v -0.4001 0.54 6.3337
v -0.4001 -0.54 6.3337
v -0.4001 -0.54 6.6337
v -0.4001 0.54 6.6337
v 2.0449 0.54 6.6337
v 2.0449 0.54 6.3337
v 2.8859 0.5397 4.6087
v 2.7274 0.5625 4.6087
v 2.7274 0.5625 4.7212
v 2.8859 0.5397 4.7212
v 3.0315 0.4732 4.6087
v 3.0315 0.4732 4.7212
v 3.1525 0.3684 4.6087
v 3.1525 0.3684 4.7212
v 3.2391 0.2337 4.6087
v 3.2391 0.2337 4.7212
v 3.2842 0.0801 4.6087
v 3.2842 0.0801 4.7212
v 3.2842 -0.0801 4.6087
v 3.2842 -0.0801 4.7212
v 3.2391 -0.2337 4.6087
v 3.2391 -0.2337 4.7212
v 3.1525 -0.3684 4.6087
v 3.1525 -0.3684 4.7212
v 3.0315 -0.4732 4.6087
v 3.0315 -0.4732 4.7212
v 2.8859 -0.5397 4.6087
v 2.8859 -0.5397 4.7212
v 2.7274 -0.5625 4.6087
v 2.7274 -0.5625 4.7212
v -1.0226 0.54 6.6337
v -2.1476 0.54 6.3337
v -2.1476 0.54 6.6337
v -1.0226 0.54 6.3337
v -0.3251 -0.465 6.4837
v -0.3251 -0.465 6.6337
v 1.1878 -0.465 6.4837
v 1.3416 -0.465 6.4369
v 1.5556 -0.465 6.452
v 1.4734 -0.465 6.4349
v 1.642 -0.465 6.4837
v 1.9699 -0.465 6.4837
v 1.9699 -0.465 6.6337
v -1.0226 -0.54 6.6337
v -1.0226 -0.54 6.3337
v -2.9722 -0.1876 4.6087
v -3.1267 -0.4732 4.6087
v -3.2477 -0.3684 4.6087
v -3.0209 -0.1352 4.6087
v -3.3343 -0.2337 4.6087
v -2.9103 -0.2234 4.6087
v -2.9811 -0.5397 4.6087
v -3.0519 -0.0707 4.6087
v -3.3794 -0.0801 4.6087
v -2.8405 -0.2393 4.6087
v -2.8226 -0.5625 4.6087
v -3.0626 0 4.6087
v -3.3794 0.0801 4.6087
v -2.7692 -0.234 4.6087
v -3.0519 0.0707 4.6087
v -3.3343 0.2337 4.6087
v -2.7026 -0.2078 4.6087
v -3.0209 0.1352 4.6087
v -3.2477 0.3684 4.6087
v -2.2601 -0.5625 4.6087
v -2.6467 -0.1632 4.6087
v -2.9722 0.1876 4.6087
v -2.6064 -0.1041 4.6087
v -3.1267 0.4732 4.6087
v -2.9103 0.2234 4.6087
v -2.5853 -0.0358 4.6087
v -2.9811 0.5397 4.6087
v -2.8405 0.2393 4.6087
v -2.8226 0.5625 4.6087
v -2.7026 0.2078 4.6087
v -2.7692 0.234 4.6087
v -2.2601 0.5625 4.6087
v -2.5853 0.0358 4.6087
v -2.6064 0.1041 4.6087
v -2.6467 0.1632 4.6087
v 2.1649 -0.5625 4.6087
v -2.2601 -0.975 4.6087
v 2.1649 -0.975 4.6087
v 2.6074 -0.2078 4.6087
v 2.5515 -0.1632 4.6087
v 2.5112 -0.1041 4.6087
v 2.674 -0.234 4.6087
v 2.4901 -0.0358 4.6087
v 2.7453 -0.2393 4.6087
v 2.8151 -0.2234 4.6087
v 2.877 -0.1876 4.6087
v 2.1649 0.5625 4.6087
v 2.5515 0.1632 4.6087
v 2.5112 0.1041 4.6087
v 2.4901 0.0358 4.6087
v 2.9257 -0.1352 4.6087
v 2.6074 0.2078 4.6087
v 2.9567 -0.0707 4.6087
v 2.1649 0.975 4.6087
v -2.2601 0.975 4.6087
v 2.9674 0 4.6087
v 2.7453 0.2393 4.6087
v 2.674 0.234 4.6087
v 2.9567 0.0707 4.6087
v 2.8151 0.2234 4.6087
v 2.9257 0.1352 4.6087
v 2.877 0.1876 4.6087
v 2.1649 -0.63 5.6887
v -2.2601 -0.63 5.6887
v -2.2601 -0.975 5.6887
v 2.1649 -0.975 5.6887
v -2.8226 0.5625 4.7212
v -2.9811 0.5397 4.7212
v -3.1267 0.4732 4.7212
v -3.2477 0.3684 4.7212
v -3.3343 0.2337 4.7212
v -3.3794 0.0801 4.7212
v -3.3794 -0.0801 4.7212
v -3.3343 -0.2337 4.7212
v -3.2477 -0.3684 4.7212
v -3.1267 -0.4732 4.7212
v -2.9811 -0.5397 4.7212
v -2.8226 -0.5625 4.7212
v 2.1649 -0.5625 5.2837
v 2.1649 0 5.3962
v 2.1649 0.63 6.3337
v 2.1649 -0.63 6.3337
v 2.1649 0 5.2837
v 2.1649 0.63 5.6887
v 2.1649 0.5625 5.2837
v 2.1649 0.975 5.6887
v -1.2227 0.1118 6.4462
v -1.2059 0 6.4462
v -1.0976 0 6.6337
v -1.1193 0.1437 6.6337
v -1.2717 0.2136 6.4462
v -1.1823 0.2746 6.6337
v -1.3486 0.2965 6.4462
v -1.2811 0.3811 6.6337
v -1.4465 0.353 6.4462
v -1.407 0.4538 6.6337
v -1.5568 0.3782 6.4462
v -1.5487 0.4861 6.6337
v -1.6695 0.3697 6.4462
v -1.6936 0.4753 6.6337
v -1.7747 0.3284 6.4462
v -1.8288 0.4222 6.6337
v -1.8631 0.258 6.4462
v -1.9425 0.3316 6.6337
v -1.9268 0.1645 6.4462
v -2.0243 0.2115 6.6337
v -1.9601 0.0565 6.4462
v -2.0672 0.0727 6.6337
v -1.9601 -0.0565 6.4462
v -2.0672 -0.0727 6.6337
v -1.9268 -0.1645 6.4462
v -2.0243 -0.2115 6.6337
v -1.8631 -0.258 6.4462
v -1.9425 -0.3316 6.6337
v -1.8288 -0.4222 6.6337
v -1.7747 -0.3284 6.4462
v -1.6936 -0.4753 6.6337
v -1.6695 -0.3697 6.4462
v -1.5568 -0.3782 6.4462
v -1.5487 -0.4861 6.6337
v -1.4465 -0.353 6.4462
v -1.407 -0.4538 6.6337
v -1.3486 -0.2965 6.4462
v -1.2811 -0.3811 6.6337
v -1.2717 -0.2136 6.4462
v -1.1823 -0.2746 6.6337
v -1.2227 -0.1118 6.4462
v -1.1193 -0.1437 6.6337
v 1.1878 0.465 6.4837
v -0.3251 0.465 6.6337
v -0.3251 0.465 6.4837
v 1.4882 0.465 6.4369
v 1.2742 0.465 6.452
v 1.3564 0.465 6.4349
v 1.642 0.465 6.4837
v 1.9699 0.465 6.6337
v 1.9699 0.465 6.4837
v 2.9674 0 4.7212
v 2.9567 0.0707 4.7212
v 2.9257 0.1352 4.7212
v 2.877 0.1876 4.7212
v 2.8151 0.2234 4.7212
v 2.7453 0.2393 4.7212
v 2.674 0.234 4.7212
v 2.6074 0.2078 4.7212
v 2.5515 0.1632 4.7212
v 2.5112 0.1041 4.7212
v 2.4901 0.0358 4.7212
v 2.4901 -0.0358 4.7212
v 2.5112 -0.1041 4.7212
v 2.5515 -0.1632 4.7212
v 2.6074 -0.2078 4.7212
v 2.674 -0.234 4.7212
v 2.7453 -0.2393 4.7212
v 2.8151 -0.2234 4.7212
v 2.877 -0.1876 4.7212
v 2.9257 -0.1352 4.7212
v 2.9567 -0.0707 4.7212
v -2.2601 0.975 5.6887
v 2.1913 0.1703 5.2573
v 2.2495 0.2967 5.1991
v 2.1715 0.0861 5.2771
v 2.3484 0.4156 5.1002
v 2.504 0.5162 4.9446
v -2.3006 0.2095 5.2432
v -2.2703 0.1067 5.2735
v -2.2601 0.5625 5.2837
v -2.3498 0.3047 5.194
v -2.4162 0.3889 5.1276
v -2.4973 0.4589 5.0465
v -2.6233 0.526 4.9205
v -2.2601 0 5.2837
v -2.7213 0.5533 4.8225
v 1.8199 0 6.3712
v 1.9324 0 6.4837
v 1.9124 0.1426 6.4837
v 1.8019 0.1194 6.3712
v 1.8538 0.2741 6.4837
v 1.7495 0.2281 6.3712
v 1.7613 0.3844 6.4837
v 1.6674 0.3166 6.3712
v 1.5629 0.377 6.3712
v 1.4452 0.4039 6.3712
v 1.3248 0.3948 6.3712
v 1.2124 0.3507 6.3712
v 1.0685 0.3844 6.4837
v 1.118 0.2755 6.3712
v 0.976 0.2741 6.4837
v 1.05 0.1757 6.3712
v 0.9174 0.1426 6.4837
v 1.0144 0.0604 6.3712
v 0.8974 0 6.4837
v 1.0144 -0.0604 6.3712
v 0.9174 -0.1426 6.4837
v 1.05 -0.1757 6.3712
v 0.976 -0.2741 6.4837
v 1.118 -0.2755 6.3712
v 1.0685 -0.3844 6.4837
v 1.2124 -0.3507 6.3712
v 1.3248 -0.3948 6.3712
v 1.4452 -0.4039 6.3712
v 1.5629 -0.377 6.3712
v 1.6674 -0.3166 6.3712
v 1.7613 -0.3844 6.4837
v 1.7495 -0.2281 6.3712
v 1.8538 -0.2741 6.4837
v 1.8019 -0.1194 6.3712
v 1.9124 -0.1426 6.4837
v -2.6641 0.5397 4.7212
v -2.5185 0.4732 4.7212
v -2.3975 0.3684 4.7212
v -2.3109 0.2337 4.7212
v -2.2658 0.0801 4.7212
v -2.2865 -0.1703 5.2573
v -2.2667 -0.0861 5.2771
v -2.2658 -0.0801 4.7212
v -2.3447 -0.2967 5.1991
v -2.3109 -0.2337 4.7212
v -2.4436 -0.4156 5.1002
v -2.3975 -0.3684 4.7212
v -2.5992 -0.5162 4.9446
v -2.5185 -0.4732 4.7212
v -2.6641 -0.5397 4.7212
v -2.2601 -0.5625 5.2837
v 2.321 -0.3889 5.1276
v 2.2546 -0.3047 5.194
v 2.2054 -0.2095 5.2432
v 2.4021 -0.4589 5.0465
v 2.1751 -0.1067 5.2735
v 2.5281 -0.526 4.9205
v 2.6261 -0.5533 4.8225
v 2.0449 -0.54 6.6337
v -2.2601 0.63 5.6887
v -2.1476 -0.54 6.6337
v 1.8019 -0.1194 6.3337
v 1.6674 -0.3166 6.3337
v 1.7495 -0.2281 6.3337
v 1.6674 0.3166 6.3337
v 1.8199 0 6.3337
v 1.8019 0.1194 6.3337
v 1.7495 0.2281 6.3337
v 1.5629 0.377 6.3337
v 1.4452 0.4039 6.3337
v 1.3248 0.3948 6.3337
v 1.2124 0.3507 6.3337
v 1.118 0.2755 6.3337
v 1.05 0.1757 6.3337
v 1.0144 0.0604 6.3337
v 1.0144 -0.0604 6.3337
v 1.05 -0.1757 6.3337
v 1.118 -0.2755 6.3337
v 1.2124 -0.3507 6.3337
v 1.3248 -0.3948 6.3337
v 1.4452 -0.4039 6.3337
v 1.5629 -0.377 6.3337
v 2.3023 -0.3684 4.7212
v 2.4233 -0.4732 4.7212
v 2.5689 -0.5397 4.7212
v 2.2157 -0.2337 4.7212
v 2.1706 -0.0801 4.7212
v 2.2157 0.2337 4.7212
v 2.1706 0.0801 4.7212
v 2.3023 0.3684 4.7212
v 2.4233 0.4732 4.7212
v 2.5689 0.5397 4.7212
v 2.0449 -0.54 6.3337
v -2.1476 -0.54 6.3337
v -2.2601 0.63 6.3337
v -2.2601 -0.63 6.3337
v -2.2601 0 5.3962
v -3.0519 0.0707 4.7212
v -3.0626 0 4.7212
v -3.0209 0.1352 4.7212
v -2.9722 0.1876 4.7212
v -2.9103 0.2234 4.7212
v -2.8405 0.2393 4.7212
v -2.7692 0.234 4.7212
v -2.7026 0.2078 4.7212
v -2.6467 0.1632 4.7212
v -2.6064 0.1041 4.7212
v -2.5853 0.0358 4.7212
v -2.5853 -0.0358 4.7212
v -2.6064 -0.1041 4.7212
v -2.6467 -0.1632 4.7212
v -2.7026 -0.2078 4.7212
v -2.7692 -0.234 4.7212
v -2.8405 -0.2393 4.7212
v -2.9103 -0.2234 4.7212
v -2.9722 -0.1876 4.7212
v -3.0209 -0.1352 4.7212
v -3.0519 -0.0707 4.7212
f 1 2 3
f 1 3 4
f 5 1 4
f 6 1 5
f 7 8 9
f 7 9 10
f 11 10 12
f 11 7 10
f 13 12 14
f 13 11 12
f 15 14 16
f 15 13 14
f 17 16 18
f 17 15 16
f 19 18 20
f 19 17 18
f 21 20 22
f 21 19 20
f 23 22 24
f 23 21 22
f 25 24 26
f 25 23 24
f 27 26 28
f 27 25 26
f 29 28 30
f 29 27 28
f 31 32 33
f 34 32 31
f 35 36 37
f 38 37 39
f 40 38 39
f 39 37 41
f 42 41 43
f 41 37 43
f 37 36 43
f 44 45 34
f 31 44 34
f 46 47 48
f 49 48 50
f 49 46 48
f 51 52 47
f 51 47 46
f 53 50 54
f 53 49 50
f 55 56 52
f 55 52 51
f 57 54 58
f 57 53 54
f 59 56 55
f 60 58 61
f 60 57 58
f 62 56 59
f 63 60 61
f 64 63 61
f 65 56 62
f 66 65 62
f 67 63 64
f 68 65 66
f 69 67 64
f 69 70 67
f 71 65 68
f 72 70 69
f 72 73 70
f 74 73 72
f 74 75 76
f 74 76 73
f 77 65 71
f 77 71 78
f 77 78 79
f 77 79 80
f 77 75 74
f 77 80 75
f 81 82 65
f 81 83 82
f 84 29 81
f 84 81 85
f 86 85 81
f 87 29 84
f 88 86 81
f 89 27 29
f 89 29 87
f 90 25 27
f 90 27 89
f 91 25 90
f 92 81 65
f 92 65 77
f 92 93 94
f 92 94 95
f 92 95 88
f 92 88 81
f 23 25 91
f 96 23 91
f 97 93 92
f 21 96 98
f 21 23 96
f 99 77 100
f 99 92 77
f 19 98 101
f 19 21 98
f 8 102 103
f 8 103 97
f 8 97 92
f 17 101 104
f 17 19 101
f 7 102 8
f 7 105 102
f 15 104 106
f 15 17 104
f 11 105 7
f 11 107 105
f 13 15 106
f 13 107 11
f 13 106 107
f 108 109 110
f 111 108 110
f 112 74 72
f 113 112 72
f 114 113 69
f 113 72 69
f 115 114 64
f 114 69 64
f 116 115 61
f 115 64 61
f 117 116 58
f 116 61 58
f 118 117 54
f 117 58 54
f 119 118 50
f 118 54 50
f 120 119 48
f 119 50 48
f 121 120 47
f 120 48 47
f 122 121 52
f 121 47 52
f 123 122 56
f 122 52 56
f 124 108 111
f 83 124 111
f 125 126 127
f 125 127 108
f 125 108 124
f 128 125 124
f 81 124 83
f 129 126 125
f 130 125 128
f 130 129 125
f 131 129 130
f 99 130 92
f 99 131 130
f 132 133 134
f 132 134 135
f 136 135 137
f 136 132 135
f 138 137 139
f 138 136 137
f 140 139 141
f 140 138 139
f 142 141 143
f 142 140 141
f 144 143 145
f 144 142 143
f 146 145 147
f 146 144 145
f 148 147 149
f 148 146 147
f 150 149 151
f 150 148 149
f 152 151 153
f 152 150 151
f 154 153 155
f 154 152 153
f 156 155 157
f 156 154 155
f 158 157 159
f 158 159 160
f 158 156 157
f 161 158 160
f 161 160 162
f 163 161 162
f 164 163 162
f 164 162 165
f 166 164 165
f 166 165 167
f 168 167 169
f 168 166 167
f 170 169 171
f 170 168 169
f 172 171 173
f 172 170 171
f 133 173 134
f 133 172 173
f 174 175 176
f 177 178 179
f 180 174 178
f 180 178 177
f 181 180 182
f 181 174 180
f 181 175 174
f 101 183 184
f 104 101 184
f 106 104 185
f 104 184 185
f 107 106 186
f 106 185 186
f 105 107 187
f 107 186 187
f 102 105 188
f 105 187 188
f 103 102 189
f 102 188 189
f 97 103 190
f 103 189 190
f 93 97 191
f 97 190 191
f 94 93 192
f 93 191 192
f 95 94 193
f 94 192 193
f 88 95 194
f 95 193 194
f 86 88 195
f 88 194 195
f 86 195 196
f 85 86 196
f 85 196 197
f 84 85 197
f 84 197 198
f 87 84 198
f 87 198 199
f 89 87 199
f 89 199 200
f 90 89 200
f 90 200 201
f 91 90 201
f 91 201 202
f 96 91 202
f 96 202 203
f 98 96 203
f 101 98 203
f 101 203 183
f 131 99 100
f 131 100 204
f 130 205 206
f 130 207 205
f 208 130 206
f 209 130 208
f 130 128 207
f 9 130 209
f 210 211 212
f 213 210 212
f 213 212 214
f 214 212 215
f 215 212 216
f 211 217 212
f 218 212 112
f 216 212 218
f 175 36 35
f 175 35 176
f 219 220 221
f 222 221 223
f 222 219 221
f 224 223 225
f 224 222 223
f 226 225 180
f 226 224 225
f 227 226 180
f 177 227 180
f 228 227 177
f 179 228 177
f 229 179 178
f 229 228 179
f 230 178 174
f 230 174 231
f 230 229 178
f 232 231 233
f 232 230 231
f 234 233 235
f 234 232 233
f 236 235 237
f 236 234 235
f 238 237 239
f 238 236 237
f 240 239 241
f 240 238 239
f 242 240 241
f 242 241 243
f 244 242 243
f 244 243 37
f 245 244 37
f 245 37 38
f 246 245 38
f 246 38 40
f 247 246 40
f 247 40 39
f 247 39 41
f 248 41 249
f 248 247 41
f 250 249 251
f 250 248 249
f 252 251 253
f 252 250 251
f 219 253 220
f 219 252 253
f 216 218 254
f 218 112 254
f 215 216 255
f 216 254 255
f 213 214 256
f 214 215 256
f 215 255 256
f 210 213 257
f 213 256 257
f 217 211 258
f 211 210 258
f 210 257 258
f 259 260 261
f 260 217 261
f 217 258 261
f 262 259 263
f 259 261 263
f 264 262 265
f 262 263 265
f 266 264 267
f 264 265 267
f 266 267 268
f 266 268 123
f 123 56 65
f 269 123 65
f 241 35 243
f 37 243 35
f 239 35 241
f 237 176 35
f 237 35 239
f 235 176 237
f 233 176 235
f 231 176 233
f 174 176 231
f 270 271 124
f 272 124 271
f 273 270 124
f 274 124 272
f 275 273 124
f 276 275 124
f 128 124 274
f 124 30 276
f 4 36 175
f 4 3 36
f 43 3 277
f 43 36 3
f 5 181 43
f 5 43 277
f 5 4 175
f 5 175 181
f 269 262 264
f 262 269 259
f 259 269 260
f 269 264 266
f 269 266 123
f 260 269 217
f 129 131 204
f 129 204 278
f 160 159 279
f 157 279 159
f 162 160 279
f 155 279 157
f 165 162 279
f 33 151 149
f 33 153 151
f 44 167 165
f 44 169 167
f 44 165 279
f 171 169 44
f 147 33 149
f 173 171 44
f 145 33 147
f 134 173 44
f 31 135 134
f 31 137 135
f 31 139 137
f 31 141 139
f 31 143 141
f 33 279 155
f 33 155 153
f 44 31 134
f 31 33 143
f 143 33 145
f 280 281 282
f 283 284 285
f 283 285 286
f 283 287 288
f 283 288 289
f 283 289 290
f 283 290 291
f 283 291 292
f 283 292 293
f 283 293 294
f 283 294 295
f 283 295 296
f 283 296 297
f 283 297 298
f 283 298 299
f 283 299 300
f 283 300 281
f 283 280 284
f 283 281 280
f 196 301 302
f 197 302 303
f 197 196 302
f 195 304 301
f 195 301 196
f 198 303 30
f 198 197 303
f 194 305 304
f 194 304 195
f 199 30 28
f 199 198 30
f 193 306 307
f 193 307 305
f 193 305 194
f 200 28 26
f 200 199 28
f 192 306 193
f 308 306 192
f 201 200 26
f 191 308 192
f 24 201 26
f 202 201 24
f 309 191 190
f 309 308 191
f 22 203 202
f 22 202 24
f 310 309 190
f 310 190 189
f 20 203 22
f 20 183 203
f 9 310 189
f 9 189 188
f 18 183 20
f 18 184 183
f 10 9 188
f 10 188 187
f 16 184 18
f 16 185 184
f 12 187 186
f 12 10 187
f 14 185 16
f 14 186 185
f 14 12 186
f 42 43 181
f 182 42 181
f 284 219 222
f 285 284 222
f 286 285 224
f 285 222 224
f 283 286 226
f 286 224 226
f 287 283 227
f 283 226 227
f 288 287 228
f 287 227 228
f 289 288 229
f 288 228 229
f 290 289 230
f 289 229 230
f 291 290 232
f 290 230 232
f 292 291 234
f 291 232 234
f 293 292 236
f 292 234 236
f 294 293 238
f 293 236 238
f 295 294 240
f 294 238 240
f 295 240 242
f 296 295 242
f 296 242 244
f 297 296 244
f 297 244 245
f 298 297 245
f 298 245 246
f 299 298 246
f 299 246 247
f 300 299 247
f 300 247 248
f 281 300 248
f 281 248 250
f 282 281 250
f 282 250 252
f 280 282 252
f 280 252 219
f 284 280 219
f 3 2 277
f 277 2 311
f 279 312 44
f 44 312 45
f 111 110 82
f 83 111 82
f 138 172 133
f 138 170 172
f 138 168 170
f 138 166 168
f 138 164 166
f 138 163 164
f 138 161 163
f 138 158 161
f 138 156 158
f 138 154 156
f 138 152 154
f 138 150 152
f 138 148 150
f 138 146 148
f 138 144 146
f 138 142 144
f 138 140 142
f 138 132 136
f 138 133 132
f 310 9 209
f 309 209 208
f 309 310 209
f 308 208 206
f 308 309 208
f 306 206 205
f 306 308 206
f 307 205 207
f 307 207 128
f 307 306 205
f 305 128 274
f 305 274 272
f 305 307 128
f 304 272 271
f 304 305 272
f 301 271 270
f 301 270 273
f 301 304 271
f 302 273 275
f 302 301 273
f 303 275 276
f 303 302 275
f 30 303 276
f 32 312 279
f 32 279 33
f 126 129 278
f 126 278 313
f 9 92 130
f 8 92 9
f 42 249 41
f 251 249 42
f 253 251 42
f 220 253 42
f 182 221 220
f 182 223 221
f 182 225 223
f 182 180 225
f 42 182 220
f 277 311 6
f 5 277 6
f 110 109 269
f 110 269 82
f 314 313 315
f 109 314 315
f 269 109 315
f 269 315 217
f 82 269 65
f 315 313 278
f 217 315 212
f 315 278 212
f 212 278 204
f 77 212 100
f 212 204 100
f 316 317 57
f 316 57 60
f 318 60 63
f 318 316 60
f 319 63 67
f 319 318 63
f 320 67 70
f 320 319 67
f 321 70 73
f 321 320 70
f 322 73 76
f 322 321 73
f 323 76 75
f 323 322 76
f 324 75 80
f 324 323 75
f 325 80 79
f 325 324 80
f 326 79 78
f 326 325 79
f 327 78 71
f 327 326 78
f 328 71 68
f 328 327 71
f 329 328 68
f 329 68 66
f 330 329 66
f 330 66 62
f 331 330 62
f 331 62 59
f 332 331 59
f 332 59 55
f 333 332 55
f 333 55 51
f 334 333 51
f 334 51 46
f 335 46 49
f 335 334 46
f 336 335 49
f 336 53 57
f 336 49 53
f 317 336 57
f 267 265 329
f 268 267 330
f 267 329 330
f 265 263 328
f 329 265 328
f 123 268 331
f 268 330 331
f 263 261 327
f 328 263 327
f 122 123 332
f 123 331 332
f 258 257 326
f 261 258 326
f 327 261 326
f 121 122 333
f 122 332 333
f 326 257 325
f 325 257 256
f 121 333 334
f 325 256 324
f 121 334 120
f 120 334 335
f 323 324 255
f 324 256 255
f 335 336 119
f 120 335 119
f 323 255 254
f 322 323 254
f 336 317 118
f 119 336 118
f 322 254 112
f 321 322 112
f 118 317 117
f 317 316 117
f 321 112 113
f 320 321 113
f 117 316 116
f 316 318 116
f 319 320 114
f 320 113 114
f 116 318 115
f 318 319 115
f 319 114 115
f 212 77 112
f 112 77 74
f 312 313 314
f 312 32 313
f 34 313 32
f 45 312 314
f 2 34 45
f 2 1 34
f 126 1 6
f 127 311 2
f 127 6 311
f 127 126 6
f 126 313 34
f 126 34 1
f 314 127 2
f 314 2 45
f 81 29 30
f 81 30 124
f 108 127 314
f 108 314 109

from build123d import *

# Parameters (mm, degrees)
BOSS_EXTRUDE5_DEPTH = 14.75
SKETCH9_W           = 7.5
SKETCH9_H           = 7.2
SKETCH9_W_2         = 16.3
BOSS_EXTRUDE6_DEPTH = 2
SKETCH10_W          = 15.3
SKETCH10_H          = 6.2
CUT_EXTRUDE4_DEPTH  = 1
SKETCH11_R          = 2.5
CUT_EXTRUDE5_DEPTH  = 1.25
BOSS_EXTRUDE7_DEPTH = 4.5
CUT_EXTRUDE7_START  = -7.5
CUT_EXTRUDE7_DEPTH  = 7.5
SKETCH18_R          = 3.75
CUT_EXTRUDE8_DEPTH  = 4.5
SKETCH19_R          = 1.6
CUT_EXTRUDE9_DEPTH  = 4.5
CHAMFER1_SIZE       = 0.75
CHAMFER1_SIZE_2     = 1.299038106
SKETCH13_R          = 2.7
CUT_EXTRUDE6_DEPTH  = 1
CHAMFER2_SIZE       = 0.75
SCALE1_SCALE        = 0.15


# Read off the part's stored shape, not the designer's step: Cut-Extrude7
with BuildPart() as part:
    # Sketch8 → Boss-Extrude5 (new, symmetric)
    with BuildSketch(Plane(origin=(0, 0, 0), x_dir=(0, 0, -1), z_dir=(1, 0, 0))):
        Polygon((0, -6.5), (0, 6.5), (-7.2, 6.5), (-7.2, 4.2), (-11.5, 4.2), (-11.5, -4.2), (-7.2, -4.2), (-7.2, -6.5), align=None)
    extrude(amount=BOSS_EXTRUDE5_DEPTH, both=True)

    # Sketch9 → Boss-Extrude6 (add)
    with BuildSketch(Plane.XY.offset(11.5)):
        with Locations((-10.25, 0)):
            Rectangle(SKETCH9_W, SKETCH9_H)
        with Locations((5.8, 0)):
            Rectangle(SKETCH9_W_2, SKETCH9_H)
    extrude(amount=BOSS_EXTRUDE6_DEPTH)

    # Sketch10 → Cut-Extrude4 (cut)
    with BuildSketch(Plane.XY.offset(13.5)):
        with Locations((5.8, 0)):
            Rectangle(SKETCH10_W, SKETCH10_H)
    extrude(amount=-CUT_EXTRUDE4_DEPTH, mode=Mode.SUBTRACT)

    # Sketch11 → Cut-Extrude5 (cut)
    with BuildSketch(Plane.XY.offset(13.5)):
        with Locations((-10.25, 0)):
            Circle(SKETCH11_R)
    extrude(amount=-CUT_EXTRUDE5_DEPTH, mode=Mode.SUBTRACT)

    # Sketch16 → Boss-Extrude7 (add)
    with BuildSketch(Plane(origin=(0, 0, 0), x_dir=(-1, 0, 0), z_dir=(0, 0, -1))):
        with BuildLine():
            Line((-14.75, -3.75), (-14.75, 3.75))
            Line((-14.75, 3.75), (-18.5, 3.75))
            ThreePointArc((-18.5, 3.75), (-22.25, 0), (-18.5, -3.75))
            Line((-18.5, -3.75), (-14.75, -3.75))
        make_face()
    boss_extrude7 = extrude(amount=-BOSS_EXTRUDE7_DEPTH)

    # Cut-Extrude7 outline → Cut-Extrude7 (cut)
    with BuildSketch(Plane.XZ.offset(3.75).offset(CUT_EXTRUDE7_START)):
        Polygon((14.75, 4.5), (18.5, 0.75), (24, 0.75), (24, 4.5), align=None)
    cut_extrude7 = extrude(amount=CUT_EXTRUDE7_DEPTH, mode=Mode.SUBTRACT)

    # Sketch18 → Cut-Extrude8 (cut)
    with BuildSketch(Plane.XY.offset(0.75)):
        with Locations((18.5, 0)):
            Circle(SKETCH18_R)
    cut_extrude8 = extrude(amount=CUT_EXTRUDE8_DEPTH, mode=Mode.SUBTRACT)

    # Sketch19 → Cut-Extrude9 (cut)
    with BuildSketch(Plane.XY.offset(0.75)):
        with Locations((18.5, 0)):
            Circle(SKETCH19_R)
    cut_extrude9 = extrude(amount=-CUT_EXTRUDE9_DEPTH, mode=Mode.SUBTRACT)

    # Mirror1: Boss-Extrude7, Cut-Extrude7, Cut-Extrude8, Cut-Extrude9 across plane
    add(boss_extrude7.mirror(Plane(origin=(0, 0, 0), x_dir=(0, 0, 1), z_dir=(1, 0, 0))))
    add(cut_extrude7.mirror(Plane(origin=(0, 0, 0), x_dir=(0, 0, 1), z_dir=(1, 0, 0))), mode=Mode.SUBTRACT)
    add(cut_extrude8.mirror(Plane(origin=(0, 0, 0), x_dir=(0, 0, 1), z_dir=(1, 0, 0))), mode=Mode.SUBTRACT)
    add(cut_extrude9.mirror(Plane(origin=(0, 0, 0), x_dir=(0, 0, 1), z_dir=(1, 0, 0))), mode=Mode.SUBTRACT)

    # Chamfer1
    # the kernel refuses this chamfer: 1.299038106, 0.75 mm, written as the material it takes off along each edge
    with BuildSketch(Plane(origin=(-10.25, 0, 13.5), x_dir=(1, 0, 0), z_dir=(0, -1, 0))) as chamfer1_piece_1_section:
        Polygon((2.5 + CHAMFER1_SIZE, 0), (2.5, -CHAMFER1_SIZE_2), (2.5, 0), align=None)
    chamfer1_piece_1 = revolve(axis=Axis((-10.25, 0, 13.5), (0, 0, 1)), mode=Mode.PRIVATE)
    chamfer1_piece_1 = split(chamfer1_piece_1, bisect_by=Plane(origin=(-13.133837987, 0, 12.25), z_dir=(0, 0, 1)), keep=Keep.TOP, mode=Mode.PRIVATE)
    add(chamfer1_piece_1, mode=Mode.SUBTRACT)

    # Sketch13 → Cut-Extrude6 (cut)
    with BuildSketch(Plane.XY.offset(12.5)):
        with Locations((9.75, 0)):
            Circle(SKETCH13_R)
    extrude(amount=-CUT_EXTRUDE6_DEPTH, mode=Mode.SUBTRACT)

    # Chamfer2
    # the kernel refuses this chamfer: 0.75 mm, written as the material it takes off along each edge
    with BuildSketch(Plane(origin=(9.75, 0, 12.5), x_dir=(1, 0, 0), z_dir=(0, -1, 0))) as chamfer2_piece_1_section:
        Polygon((2.7 + CHAMFER2_SIZE, 0), (2.7, -CHAMFER2_SIZE), (2.7, 0), align=None)
    chamfer2_piece_1 = revolve(axis=Axis((9.75, 0, 12.5), (0, 0, 1)), mode=Mode.PRIVATE)
    chamfer2_piece_1 = split(chamfer2_piece_1, bisect_by=Plane(origin=(6.68747717, -3.1, 12.13747717), z_dir=(0, 1, 0)), keep=Keep.TOP, mode=Mode.PRIVATE)
    chamfer2_piece_1 = split(chamfer2_piece_1, bisect_by=Plane(origin=(6.68747717, 3.1, 12.13747717), z_dir=(0, -1, 0)), keep=Keep.TOP, mode=Mode.PRIVATE)
    add(chamfer2_piece_1, mode=Mode.SUBTRACT)


with BuildPart() as part_1:
    # Scale1: scaled about (-0.05599767, 0, 5.421987795)
    add(part.part.scale(SCALE1_SCALE).moved(Location((-0.047598019, 0, 4.608689626))))


solid = part_1.part
